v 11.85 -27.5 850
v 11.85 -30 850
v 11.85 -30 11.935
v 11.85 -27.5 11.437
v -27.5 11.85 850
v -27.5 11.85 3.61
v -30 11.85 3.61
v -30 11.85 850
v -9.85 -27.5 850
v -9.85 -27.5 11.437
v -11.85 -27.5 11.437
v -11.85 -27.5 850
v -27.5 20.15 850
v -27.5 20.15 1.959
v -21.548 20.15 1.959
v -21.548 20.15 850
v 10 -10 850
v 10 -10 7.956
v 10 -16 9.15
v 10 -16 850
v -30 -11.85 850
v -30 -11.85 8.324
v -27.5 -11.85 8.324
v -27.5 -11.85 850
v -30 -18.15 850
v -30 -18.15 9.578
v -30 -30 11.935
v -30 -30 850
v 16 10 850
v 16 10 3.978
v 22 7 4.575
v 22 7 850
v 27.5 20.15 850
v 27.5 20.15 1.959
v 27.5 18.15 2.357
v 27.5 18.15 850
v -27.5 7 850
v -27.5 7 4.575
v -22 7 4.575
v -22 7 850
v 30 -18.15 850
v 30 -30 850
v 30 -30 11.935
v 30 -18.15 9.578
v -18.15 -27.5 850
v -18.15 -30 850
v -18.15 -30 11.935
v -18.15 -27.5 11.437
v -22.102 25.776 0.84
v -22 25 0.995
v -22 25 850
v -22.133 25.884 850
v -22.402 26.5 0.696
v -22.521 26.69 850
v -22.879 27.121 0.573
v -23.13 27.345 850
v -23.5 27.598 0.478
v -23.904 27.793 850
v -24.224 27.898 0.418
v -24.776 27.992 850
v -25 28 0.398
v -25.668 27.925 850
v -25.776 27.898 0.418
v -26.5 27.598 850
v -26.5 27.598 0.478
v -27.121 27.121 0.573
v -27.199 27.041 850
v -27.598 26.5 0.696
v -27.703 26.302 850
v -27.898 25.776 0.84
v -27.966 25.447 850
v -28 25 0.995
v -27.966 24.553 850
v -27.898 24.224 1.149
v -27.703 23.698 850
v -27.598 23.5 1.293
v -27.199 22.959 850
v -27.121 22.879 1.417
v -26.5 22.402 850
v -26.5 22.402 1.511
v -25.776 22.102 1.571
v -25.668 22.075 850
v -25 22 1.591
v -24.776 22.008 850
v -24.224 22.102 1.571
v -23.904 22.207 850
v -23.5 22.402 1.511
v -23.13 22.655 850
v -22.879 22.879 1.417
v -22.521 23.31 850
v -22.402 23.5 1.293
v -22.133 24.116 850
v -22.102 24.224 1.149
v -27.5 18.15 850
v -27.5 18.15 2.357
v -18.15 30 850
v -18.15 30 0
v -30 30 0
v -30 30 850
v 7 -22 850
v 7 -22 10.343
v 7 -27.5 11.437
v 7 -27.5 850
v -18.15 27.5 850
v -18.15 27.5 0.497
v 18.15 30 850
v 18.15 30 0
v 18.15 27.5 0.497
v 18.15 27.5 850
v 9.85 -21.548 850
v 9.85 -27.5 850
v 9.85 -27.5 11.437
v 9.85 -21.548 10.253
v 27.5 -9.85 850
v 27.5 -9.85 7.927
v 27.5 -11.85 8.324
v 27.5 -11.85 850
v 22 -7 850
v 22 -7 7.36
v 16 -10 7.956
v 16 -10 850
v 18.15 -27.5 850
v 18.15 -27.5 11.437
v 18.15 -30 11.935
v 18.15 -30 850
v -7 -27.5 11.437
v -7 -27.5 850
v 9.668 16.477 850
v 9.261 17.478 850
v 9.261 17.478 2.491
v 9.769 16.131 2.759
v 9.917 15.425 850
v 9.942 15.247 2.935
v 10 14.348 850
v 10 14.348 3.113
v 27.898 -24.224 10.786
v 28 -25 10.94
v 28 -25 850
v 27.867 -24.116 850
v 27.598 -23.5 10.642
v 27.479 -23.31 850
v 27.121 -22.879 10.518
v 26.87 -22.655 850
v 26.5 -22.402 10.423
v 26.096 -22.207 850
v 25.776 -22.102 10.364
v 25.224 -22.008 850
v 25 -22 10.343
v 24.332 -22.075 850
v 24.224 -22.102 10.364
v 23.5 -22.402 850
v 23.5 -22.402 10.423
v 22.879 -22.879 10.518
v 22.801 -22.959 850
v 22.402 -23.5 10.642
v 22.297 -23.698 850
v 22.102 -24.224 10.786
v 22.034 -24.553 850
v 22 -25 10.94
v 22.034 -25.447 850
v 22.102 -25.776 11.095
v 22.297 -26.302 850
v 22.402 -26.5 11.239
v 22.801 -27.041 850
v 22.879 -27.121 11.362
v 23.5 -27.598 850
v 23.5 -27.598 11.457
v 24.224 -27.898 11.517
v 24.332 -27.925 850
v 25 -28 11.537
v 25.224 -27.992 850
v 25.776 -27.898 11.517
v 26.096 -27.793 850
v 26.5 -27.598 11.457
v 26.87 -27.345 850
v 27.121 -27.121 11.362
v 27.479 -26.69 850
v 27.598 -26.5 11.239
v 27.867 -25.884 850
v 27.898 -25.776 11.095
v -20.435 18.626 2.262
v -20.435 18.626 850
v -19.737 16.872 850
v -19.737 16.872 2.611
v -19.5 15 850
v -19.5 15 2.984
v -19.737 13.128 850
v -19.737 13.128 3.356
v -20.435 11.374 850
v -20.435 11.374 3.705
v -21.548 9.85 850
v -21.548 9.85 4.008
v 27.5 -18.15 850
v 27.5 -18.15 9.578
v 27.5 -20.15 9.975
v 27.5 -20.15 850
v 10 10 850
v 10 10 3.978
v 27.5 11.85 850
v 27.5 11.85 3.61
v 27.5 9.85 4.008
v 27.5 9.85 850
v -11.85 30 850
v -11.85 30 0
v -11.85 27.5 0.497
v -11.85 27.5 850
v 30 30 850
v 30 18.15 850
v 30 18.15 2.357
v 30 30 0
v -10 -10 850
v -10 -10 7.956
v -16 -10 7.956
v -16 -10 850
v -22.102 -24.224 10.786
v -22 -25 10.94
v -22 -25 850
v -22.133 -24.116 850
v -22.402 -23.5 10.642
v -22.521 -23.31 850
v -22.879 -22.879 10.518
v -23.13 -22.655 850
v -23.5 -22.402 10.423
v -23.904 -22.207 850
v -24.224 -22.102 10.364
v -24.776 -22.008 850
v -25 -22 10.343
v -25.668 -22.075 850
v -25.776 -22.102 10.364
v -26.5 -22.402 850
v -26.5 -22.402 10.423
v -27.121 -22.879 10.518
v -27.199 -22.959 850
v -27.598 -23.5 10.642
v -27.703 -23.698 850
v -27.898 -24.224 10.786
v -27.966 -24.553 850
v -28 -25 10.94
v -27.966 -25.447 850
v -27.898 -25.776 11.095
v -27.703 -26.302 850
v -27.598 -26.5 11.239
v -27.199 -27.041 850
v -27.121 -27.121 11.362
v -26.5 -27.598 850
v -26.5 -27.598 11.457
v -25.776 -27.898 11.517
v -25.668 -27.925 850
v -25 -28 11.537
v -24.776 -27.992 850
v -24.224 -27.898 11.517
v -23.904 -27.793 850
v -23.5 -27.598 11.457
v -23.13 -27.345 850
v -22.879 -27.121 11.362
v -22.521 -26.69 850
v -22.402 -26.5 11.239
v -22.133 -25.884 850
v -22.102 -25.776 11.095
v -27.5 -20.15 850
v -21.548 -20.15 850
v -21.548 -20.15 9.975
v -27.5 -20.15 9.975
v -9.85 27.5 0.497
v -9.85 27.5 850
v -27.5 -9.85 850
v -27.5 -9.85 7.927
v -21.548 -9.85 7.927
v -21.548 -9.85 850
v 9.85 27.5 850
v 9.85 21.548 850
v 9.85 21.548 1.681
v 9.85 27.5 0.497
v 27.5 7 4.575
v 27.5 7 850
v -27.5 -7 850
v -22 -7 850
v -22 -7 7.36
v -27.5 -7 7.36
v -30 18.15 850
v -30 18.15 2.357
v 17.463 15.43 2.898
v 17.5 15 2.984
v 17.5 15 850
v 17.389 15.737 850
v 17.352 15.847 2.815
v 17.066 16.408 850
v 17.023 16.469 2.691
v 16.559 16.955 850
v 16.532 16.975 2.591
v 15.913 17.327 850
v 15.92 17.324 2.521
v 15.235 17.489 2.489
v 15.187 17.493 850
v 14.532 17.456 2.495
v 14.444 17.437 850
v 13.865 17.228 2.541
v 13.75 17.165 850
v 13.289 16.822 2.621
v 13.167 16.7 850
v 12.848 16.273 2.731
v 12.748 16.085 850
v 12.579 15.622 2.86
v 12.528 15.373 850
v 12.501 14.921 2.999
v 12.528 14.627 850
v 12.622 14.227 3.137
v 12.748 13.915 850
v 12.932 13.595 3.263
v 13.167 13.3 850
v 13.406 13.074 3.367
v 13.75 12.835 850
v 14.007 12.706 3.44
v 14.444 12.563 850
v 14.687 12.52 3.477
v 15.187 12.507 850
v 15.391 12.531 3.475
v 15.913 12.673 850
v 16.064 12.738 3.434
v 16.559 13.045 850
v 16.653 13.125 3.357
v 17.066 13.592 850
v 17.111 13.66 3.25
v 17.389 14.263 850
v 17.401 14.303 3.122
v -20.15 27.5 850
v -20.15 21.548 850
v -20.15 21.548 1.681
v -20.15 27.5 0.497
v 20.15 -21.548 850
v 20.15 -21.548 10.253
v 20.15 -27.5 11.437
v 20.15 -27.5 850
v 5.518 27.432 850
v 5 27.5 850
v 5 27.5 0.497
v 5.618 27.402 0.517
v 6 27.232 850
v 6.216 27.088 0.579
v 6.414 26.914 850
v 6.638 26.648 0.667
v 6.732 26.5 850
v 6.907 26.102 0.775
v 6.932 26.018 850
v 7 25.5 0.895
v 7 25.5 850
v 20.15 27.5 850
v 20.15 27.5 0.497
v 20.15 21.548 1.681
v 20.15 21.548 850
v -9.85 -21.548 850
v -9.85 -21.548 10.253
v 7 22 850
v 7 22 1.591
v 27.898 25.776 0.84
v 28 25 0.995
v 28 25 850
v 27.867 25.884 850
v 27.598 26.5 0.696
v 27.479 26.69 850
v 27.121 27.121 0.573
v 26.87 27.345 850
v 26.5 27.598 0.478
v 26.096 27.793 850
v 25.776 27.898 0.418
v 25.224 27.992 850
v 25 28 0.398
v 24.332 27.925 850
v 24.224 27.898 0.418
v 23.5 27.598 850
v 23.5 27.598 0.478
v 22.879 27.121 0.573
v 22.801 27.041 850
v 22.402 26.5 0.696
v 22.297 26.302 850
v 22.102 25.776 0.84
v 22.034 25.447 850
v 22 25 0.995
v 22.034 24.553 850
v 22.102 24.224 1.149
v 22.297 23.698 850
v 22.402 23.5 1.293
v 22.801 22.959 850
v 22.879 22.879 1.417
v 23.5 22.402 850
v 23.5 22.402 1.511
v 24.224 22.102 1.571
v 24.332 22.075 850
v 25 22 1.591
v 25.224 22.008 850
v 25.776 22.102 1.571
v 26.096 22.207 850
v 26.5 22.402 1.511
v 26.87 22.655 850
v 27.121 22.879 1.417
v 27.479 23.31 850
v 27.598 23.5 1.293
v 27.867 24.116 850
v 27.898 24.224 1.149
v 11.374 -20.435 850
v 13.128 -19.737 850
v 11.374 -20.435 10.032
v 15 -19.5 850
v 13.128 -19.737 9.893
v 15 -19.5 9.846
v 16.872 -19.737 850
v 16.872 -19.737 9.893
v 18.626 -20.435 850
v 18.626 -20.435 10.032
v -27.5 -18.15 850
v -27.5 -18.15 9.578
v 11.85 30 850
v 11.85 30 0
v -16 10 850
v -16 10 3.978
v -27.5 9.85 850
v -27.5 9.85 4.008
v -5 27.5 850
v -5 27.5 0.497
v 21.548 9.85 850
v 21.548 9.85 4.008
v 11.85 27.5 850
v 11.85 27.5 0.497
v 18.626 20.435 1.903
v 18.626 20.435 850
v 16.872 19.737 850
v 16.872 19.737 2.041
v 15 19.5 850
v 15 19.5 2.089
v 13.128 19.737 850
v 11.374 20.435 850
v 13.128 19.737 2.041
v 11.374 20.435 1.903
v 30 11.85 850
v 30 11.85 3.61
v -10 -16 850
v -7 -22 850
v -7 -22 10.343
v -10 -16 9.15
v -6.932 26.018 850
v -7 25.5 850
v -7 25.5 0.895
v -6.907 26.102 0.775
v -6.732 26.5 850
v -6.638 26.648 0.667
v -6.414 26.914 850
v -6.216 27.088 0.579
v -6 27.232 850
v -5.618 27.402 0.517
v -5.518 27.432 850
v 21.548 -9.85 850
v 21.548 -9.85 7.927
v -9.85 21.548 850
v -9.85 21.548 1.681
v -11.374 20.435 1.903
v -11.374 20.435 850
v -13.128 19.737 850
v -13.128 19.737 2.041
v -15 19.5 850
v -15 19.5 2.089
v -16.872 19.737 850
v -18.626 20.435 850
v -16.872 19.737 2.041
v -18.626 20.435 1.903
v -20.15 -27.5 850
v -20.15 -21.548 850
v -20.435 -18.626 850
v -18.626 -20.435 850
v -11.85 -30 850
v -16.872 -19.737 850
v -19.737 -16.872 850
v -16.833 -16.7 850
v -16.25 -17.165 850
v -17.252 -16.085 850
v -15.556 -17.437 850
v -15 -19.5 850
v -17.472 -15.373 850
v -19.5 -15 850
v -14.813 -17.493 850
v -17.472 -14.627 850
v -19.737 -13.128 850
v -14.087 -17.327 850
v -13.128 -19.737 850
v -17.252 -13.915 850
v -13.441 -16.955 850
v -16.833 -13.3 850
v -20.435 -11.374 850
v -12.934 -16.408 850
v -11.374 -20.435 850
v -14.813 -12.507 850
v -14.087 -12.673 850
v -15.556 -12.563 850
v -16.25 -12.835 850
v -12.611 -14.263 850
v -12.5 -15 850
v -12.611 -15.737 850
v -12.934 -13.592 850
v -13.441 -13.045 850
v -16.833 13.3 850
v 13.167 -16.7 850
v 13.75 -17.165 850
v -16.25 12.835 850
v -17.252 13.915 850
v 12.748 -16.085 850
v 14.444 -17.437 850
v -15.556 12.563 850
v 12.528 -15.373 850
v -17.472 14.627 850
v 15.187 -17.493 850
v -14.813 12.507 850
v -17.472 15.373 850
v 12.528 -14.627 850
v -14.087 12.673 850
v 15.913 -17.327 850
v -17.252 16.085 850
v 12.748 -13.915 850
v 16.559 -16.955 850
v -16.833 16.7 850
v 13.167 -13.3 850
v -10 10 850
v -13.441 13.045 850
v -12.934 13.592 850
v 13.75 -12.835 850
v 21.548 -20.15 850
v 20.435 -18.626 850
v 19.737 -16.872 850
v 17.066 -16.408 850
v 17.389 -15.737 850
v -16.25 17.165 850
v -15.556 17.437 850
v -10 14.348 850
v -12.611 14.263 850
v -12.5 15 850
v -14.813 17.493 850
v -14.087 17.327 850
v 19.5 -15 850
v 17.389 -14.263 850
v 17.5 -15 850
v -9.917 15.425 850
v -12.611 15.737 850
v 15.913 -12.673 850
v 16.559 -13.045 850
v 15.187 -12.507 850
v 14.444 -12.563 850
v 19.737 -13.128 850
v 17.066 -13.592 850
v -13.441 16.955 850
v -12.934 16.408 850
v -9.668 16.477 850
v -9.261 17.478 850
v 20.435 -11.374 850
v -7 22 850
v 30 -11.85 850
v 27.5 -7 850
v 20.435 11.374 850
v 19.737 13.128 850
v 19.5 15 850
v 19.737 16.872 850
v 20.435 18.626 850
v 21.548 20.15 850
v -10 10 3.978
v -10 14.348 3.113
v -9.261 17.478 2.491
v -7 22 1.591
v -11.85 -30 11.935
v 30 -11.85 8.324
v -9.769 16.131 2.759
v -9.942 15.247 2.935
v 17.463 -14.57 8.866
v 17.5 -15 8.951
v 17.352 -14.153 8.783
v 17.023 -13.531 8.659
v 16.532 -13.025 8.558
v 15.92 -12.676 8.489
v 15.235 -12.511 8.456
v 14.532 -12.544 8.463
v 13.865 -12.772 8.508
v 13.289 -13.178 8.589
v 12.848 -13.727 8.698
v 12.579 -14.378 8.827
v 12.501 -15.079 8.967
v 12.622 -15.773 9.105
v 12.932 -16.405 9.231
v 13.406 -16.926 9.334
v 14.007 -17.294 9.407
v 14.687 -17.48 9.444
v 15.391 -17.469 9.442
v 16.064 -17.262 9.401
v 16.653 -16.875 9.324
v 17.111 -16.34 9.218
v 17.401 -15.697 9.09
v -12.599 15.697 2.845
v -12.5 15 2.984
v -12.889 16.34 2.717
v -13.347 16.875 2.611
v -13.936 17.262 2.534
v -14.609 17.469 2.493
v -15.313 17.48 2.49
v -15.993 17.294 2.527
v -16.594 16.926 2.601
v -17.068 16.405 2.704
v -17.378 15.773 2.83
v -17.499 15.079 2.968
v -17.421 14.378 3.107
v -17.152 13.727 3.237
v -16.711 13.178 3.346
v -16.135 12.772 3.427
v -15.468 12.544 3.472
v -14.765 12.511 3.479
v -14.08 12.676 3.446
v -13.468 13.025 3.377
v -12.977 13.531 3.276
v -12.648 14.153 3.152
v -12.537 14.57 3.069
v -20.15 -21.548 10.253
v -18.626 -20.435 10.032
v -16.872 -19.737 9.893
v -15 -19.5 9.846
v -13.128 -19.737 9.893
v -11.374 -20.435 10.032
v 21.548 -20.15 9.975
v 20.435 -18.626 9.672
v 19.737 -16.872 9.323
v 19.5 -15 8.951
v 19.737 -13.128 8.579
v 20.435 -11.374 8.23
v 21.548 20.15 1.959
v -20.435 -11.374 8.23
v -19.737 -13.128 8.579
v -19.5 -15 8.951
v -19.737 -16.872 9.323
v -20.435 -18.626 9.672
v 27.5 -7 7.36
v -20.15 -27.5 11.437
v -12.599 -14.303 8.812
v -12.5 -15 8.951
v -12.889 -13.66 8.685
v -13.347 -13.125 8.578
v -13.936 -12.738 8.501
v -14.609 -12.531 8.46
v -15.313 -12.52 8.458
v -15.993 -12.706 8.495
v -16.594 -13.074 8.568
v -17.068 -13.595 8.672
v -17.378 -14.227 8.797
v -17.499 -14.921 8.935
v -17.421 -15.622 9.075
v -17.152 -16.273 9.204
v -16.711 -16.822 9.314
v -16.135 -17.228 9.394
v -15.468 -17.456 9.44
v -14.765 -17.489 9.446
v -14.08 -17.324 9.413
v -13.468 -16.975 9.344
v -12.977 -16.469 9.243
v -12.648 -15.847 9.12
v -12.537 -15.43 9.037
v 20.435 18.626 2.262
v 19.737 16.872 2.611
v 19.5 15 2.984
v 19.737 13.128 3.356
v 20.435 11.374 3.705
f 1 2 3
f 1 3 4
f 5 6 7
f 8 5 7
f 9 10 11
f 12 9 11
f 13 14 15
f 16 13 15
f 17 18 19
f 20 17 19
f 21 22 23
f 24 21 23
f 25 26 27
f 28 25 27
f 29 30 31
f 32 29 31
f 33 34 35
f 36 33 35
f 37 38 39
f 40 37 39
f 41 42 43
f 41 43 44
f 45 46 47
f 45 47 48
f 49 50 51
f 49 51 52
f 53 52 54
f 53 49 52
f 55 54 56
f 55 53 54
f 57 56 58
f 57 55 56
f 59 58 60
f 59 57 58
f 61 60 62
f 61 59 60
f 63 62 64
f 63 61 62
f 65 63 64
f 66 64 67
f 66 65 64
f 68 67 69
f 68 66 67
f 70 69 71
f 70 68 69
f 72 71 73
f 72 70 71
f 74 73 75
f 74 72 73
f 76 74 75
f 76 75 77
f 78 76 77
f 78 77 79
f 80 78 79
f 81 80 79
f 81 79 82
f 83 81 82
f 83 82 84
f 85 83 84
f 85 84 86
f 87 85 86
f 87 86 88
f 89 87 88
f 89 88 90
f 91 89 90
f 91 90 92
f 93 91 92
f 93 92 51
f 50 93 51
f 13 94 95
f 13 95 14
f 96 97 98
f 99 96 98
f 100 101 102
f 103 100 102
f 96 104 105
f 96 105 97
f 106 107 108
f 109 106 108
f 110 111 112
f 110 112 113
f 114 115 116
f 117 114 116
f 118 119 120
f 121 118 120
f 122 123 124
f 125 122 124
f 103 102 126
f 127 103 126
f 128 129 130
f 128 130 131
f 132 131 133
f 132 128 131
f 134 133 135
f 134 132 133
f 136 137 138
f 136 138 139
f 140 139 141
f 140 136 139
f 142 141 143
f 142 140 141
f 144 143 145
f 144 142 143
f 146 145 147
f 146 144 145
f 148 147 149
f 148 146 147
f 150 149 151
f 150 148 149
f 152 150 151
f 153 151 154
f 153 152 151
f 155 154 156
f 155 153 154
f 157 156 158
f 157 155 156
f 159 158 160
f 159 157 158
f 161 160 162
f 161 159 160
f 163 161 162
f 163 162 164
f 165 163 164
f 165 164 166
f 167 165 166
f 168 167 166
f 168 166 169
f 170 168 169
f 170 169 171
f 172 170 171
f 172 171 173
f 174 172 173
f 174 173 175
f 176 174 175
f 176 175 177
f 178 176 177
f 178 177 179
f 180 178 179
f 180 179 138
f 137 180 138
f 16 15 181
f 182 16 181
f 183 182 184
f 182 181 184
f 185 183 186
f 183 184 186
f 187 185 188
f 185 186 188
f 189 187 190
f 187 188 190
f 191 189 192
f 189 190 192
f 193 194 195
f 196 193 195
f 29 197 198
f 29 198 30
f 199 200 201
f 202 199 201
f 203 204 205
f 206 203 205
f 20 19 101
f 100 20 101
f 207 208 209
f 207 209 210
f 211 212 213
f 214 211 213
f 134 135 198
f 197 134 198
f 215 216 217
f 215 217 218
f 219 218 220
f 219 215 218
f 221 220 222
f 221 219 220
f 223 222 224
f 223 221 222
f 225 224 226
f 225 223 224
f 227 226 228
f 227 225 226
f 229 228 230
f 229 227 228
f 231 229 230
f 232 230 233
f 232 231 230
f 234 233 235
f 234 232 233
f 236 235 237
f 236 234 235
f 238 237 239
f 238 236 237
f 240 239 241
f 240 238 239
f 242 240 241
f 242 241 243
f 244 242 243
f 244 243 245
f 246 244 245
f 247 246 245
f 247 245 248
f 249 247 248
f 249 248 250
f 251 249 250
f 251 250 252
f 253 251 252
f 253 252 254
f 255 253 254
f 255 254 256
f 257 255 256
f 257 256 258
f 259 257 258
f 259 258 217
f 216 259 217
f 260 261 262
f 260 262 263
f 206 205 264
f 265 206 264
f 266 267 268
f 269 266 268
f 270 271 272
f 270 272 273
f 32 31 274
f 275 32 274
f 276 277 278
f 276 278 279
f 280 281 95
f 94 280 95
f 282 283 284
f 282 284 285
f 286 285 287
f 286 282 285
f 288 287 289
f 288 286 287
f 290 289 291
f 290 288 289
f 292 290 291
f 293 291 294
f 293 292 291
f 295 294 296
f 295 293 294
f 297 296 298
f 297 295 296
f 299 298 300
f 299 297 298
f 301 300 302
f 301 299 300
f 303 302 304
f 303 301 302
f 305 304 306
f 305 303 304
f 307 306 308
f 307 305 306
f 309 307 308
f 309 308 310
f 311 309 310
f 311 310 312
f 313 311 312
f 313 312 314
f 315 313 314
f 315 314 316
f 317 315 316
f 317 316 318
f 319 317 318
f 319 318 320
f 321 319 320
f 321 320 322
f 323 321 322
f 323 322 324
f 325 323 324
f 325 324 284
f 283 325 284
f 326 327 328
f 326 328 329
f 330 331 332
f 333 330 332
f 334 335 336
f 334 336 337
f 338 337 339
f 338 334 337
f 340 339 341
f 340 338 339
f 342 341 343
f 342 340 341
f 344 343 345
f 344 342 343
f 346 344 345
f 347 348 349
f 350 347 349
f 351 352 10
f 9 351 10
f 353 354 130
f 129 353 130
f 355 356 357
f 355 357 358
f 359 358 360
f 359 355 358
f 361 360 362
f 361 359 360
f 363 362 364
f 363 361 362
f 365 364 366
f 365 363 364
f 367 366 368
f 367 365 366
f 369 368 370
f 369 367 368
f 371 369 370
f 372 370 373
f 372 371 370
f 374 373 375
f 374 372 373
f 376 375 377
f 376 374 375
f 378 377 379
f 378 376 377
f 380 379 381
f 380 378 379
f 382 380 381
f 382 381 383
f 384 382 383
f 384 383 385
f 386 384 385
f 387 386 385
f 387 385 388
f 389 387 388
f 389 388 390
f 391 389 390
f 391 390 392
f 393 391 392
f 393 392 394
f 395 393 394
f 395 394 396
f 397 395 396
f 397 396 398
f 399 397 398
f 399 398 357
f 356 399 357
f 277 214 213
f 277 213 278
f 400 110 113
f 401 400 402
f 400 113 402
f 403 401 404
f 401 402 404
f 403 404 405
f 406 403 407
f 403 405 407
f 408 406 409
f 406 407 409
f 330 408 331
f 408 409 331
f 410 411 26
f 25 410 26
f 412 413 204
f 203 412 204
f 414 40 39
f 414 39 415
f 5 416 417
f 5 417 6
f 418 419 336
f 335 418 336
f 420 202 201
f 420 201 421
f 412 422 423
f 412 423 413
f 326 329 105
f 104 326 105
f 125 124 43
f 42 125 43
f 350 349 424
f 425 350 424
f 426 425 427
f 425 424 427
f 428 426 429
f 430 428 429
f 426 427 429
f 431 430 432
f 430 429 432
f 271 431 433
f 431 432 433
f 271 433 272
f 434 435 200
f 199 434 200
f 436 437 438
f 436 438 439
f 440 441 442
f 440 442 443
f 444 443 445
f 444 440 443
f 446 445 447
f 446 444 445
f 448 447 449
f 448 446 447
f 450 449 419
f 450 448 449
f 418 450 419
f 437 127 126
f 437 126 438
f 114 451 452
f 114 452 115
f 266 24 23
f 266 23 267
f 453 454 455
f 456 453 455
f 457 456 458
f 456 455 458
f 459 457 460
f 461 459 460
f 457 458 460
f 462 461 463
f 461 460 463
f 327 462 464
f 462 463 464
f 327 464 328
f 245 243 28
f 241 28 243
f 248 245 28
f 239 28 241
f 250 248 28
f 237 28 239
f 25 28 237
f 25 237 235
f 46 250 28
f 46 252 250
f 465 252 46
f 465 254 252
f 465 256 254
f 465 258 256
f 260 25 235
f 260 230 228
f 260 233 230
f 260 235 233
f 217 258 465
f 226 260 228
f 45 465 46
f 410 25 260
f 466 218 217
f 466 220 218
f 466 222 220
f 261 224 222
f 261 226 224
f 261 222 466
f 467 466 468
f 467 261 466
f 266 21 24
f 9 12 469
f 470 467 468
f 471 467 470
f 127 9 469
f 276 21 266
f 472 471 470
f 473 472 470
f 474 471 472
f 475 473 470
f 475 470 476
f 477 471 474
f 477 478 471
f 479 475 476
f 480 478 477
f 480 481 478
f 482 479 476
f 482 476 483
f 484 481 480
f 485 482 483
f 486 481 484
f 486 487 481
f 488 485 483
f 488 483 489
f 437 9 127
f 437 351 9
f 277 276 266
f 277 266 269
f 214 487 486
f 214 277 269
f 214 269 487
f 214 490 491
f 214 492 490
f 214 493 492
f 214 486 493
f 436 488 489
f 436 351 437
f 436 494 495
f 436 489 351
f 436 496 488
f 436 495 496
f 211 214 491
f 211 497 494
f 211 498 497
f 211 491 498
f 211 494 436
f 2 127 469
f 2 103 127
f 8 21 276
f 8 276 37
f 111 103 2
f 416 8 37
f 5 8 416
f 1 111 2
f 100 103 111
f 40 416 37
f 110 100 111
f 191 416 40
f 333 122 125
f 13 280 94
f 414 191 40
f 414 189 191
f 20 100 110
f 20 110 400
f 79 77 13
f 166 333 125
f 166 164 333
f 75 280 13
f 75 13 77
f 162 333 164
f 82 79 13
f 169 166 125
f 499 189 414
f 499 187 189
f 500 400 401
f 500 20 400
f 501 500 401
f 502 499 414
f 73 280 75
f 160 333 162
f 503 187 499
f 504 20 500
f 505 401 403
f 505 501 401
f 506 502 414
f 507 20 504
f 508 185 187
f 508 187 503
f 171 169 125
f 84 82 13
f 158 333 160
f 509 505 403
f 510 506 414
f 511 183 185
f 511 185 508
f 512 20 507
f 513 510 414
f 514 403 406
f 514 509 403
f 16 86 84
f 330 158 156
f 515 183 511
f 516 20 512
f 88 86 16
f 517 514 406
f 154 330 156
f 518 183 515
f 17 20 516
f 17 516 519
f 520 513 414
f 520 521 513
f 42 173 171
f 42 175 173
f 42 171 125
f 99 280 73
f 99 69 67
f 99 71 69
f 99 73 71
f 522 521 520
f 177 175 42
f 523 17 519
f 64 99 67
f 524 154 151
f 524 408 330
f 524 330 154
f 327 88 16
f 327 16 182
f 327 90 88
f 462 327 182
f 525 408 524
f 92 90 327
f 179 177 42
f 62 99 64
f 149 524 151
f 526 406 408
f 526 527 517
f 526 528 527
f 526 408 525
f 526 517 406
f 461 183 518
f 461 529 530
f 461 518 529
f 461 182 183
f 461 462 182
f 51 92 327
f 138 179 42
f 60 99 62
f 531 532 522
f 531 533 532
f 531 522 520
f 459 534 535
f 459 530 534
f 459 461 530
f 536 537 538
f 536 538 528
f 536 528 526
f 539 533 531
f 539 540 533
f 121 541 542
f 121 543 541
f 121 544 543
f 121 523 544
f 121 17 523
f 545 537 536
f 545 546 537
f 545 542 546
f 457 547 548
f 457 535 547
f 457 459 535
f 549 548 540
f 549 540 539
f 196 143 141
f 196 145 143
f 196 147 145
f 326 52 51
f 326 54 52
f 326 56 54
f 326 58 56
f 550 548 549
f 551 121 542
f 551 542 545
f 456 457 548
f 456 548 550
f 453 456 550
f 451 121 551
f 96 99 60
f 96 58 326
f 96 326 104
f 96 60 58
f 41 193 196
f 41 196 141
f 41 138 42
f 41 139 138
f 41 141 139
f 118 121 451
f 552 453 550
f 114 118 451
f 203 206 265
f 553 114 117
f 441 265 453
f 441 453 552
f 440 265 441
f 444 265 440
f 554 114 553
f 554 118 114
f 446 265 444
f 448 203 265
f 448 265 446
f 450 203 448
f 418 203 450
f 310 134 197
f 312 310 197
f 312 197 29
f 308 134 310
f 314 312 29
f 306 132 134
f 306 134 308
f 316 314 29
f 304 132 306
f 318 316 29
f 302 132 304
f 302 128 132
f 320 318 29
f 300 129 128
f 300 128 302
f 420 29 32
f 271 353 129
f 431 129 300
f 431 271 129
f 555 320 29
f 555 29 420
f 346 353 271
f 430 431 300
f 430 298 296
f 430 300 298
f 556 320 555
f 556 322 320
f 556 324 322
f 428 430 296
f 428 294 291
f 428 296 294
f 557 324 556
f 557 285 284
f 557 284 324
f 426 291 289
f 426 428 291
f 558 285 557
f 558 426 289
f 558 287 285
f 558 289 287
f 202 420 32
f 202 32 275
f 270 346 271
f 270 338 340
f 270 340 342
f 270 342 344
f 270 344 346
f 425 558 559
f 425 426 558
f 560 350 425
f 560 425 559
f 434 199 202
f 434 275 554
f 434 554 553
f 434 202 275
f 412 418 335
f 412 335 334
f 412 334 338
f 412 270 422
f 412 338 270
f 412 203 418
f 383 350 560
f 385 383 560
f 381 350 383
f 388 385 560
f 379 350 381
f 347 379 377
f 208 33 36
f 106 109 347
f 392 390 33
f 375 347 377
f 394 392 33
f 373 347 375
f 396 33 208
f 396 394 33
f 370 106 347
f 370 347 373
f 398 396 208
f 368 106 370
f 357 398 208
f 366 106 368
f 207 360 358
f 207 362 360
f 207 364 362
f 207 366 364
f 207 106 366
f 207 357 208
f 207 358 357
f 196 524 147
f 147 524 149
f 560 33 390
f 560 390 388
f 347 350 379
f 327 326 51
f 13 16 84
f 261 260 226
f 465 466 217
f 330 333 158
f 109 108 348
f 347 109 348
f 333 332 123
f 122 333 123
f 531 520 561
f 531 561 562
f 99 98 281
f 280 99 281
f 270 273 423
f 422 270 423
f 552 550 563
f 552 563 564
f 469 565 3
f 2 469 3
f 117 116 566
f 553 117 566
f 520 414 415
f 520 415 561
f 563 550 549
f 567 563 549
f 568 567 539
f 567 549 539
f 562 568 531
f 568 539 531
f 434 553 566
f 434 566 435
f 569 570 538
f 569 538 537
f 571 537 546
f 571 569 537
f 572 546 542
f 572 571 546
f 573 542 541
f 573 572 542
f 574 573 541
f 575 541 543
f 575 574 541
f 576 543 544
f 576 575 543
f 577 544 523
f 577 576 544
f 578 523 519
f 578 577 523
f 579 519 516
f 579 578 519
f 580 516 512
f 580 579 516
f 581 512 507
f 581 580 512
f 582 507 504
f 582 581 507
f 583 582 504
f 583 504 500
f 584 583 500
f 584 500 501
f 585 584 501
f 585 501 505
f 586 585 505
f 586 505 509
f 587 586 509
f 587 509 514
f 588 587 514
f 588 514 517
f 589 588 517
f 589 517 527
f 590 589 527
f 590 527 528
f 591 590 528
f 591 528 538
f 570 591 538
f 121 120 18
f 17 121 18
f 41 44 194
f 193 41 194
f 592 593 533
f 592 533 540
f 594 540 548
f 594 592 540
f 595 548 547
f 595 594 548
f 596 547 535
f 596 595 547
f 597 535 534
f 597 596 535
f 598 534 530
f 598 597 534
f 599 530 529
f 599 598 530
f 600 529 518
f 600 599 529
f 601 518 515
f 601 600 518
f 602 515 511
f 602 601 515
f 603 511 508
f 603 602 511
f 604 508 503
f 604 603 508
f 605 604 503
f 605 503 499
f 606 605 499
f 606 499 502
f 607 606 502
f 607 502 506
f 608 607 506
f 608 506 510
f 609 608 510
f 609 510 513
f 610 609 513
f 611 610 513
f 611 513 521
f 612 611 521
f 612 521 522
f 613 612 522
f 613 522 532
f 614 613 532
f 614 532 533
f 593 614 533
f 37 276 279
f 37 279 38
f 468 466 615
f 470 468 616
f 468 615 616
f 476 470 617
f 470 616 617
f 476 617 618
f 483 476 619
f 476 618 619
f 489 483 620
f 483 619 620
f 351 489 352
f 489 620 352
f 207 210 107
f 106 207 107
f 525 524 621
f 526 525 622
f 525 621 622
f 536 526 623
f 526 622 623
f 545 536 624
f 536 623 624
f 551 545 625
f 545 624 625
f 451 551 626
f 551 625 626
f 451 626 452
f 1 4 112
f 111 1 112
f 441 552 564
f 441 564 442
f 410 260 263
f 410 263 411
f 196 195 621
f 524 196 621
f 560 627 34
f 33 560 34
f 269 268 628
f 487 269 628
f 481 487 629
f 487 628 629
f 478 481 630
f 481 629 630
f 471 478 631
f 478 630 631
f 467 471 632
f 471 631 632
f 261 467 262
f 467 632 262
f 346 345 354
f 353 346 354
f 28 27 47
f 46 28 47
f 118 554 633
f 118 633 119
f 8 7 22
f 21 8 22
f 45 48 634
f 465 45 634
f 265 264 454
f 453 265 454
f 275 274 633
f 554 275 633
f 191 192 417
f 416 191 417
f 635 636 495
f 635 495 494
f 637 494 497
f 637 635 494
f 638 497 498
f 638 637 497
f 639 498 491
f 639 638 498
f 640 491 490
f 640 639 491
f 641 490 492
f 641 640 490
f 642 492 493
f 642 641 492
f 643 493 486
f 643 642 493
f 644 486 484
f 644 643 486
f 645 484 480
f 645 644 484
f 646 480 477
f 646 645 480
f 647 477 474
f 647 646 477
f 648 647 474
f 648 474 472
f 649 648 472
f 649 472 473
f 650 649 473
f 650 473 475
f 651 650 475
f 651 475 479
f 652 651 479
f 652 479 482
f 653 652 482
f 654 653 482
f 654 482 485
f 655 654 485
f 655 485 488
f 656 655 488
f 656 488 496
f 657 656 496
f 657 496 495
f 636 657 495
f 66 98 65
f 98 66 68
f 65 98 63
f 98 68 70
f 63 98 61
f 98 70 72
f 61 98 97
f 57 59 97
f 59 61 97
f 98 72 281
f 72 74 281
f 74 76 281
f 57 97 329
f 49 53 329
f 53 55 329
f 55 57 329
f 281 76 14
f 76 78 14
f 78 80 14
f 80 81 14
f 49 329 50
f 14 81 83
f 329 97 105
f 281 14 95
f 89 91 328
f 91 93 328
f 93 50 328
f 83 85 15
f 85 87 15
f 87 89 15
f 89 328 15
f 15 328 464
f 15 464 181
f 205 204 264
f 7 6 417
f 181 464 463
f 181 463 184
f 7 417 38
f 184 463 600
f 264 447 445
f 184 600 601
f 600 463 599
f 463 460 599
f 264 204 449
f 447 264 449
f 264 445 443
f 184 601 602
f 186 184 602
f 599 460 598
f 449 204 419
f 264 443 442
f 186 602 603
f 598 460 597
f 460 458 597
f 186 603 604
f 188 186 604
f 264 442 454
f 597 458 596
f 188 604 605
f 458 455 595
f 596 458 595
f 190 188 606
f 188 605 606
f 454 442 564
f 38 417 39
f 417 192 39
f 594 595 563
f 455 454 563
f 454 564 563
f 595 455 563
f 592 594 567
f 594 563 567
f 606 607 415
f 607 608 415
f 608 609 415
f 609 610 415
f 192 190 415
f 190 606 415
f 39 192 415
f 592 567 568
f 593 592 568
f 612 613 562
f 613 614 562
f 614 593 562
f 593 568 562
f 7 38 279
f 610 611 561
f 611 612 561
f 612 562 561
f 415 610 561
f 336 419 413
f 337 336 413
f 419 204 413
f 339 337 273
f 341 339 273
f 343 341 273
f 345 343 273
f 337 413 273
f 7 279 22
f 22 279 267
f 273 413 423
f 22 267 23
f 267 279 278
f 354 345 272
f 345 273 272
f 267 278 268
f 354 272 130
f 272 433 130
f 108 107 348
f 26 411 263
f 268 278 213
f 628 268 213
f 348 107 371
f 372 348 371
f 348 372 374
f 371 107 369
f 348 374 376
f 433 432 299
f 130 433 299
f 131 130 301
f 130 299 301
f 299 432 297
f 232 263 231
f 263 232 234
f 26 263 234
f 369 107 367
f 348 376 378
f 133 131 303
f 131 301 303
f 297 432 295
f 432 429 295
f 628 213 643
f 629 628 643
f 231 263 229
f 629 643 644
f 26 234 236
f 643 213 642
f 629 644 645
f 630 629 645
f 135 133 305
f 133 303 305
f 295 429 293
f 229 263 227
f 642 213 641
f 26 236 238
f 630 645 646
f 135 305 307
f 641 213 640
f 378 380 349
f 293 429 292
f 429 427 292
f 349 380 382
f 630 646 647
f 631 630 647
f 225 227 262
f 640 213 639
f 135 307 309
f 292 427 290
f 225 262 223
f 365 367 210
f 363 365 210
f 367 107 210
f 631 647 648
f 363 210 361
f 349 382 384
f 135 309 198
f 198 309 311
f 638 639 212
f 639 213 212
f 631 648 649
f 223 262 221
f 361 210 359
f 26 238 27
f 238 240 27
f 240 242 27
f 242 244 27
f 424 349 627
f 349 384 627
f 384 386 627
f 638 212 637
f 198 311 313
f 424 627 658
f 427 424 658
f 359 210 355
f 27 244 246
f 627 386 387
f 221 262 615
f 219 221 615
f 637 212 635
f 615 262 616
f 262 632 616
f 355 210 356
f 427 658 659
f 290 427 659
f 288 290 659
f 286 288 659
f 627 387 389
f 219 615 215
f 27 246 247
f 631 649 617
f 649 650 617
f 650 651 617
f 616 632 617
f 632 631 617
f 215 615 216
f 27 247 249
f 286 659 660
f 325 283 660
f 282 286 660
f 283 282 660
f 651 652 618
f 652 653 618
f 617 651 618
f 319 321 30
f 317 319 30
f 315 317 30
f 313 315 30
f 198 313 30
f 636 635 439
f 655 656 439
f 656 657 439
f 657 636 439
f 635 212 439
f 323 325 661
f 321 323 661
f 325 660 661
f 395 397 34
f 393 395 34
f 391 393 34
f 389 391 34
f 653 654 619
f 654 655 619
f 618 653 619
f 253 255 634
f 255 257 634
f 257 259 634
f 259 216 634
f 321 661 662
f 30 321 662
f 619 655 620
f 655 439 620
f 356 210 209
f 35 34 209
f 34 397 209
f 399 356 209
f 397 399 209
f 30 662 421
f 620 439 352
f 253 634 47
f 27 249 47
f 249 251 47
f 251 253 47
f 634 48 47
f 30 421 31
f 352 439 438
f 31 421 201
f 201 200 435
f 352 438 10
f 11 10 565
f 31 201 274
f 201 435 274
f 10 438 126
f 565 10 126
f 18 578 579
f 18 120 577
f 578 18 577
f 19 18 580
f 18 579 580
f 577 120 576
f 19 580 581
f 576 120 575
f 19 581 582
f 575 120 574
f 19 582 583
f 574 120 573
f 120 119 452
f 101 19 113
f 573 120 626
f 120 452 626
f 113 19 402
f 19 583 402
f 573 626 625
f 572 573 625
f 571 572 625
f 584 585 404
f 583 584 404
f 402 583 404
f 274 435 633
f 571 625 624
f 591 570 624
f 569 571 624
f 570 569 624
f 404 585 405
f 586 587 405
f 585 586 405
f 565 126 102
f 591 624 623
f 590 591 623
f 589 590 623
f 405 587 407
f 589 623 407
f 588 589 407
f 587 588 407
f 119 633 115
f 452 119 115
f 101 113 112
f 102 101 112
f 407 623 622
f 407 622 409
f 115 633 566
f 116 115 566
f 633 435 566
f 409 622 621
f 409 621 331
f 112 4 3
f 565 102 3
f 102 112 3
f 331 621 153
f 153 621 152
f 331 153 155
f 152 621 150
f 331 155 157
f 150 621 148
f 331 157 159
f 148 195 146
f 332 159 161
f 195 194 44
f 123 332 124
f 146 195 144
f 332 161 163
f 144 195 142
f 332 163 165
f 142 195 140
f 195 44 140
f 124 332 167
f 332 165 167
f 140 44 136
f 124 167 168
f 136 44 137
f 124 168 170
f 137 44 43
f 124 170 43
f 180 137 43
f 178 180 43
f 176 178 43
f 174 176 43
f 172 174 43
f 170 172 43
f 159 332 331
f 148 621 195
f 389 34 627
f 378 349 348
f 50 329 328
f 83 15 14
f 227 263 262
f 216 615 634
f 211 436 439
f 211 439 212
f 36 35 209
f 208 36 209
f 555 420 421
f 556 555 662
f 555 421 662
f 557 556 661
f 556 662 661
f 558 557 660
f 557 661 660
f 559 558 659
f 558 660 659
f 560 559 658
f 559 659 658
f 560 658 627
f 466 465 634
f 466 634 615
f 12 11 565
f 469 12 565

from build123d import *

# Parameters (mm, degrees)
F0_R          = 3
F0_R_2        = 2.5
F1_DEPTH      = 850
F2_R          = 2
F3_R          = 7
F5_DEPTH      = 30
F5_DEPTH_BACK = 30


# Not quite as in the source:
# - a feature names something its author has since deleted; it is built from what else it names


with BuildPart() as f1:
    # F0 (on Top) → F1 (new body)
    with BuildSketch(Plane.XY):
        with BuildLine():
            Line((18.15, -30), (30, -30))
            Line((30, -30), (30, -18.15))
            Line((30, -18.15), (27.5, -18.15))
            Line((27.5, -18.15), (27.5, -20.15))
            Line((27.5, -20.15), (21.5477069044, -20.15))
            ThreePointArc((21.5477069044, -20.15), (19.5, -15), (21.5477069044, -9.85))
            Line((21.5477069044, -9.85), (27.5, -9.85))
            Line((27.5, -9.85), (27.5, -11.85))
            Line((27.5, -11.85), (30, -11.85))
            Line((30, -11.85), (30, 11.85))
            Line((30, 11.85), (27.5, 11.85))
            Line((27.5, 11.85), (27.5, 9.85))
            Line((27.5, 9.85), (21.5477069044, 9.85))
            ThreePointArc((21.5477069044, 9.85), (19.5, 15), (21.5477069044, 20.15))
            Line((21.5477069044, 20.15), (27.5, 20.15))
            Line((27.5, 20.15), (27.5, 18.15))
            Line((27.5, 18.15), (30, 18.15))
            Line((30, 18.15), (30, 30))
            Line((30, 30), (18.15, 30))
            Line((18.15, 30), (18.15, 27.5))
            Line((18.15, 27.5), (20.15, 27.5))
            Line((20.15, 27.5), (20.15, 21.5477069044))
            ThreePointArc((20.15, 21.5477069044), (15, 19.5), (9.85, 21.5477069044))
            Line((9.85, 21.5477069044), (9.85, 27.5))
            Line((9.85, 27.5), (11.85, 27.5))
            Line((11.85, 27.5), (11.85, 30))
            Line((11.85, 30), (-11.85, 30))
            Line((-11.85, 30), (-11.85, 27.5))
            Line((-11.85, 27.5), (-9.85, 27.5))
            Line((-9.85, 27.5), (-9.85, 21.5477069044))
            ThreePointArc((-9.85, 21.5477069044), (-15, 19.5), (-20.15, 21.5477069044))
            Line((-20.15, 21.5477069044), (-20.15, 27.5))
            Line((-20.15, 27.5), (-18.15, 27.5))
            Line((-18.15, 27.5), (-18.15, 30))
            Line((-18.15, 30), (-30, 30))
            Line((-30, 30), (-30, 18.15))
            Line((-30, 18.15), (-27.5, 18.15))
            Line((-27.5, 18.15), (-27.5, 20.15))
            Line((-27.5, 20.15), (-21.5477069044, 20.15))
            ThreePointArc((-21.5477069044, 20.15), (-19.5, 15), (-21.5477069044, 9.85))
            Line((-21.5477069044, 9.85), (-27.5, 9.85))
            Line((-27.5, 9.85), (-27.5, 11.85))
            Line((-27.5, 11.85), (-30, 11.85))
            Line((-30, 11.85), (-30, -11.85))
            Line((-30, -11.85), (-27.5, -11.85))
            Line((-27.5, -11.85), (-27.5, -9.85))
            Line((-27.5, -9.85), (-21.5477069044, -9.85))
            ThreePointArc((-21.5477069044, -9.85), (-19.5, -15), (-21.5477069044, -20.15))
            Line((-21.5477069044, -20.15), (-27.5, -20.15))
            Line((-27.5, -20.15), (-27.5, -18.15))
            Line((-27.5, -18.15), (-30, -18.15))
            Line((-30, -18.15), (-30, -30))
            Line((-30, -30), (-18.15, -30))
            Line((-18.15, -30), (-18.15, -27.5))
            Line((-18.15, -27.5), (-20.15, -27.5))
            Line((-20.15, -27.5), (-20.15, -21.5477069044))
            ThreePointArc((-20.15, -21.5477069044), (-15, -19.5), (-9.85, -21.5477069044))
            Line((-9.85, -21.5477069044), (-9.85, -27.5))
            Line((-9.85, -27.5), (-11.85, -27.5))
            Line((-11.85, -27.5), (-11.85, -30))
            Line((-11.85, -30), (11.85, -30))
            Line((11.85, -30), (11.85, -27.5))
            Line((11.85, -27.5), (9.85, -27.5))
            Line((9.85, -27.5), (9.85, -21.5477069044))
            ThreePointArc((9.85, -21.5477069044), (15, -19.5), (20.15, -21.5477069044))
            Line((20.15, -21.5477069044), (20.15, -27.5))
            Line((20.15, -27.5), (18.15, -27.5))
            Line((18.15, -27.5), (18.15, -30))
        make_face()
        with Locations((-25, -25)):
            Circle(F0_R, mode=Mode.SUBTRACT)
        with Locations((-15, -15)):
            Circle(F0_R_2, mode=Mode.SUBTRACT)
        with Locations((25, -25)):
            Circle(F0_R, mode=Mode.SUBTRACT)
        with Locations((15, -15)):
            Circle(F0_R_2, mode=Mode.SUBTRACT)
        with Locations((-25, 25)):
            Circle(F0_R, mode=Mode.SUBTRACT)
        with Locations((-15, 15)):
            Circle(F0_R_2, mode=Mode.SUBTRACT)
        Polygon((-7, 22), (-7, 27.5), (0, 27.5), (7, 27.5), (7, 22), (10, 16), (10, 10), (16, 10), (22, 7), (27.5, 7), (27.5, 0), (27.5, -7), (22, -7), (16, -10), (10, -10), (10, -16), (7, -22), (7, -27.5), (0, -27.5), (-7, -27.5), (-7, -22), (-10, -16), (-10, -10), (-16, -10), (-22, -7), (-27.5, -7), (-27.5, 0), (-27.5, 7), (-22, 7), (-16, 10), (-10, 10), (-10, 16), align=None, mode=Mode.SUBTRACT)
        with Locations((15, 15)):
            Circle(F0_R_2, mode=Mode.SUBTRACT)
        with Locations((25, 25)):
            Circle(F0_R, mode=Mode.SUBTRACT)
    extrude(amount=F1_DEPTH)

    # F2
    f2_edges = [f1.edges().sort_by_distance(p)[0] for p in [
        (-7, 27.5, 425),
        (7, 27.5, 425),
    ]]
    fillet(f2_edges, radius=F2_R)

    # F3
    f3_edges = [f1.edges().sort_by_distance(p)[0] for p in [
        (-10, 16, 425),
        (10, 16, 425),
    ]]
    fillet(f3_edges, radius=F3_R)

    # F4 (on Right) → F5 (cut, two sides)
    with BuildSketch(Plane.YZ) as f5_sk:
        Polygon((-164.2855995683, 38.6458085579), (-188.5911429791, -83.5464097089), (5.6944565892, -122.1922182668), (30, 0), align=None)
    extrude(amount=F5_DEPTH, mode=Mode.SUBTRACT)
    extrude(f5_sk.sketch, amount=-F5_DEPTH_BACK, mode=Mode.SUBTRACT)


solid = f1.part
